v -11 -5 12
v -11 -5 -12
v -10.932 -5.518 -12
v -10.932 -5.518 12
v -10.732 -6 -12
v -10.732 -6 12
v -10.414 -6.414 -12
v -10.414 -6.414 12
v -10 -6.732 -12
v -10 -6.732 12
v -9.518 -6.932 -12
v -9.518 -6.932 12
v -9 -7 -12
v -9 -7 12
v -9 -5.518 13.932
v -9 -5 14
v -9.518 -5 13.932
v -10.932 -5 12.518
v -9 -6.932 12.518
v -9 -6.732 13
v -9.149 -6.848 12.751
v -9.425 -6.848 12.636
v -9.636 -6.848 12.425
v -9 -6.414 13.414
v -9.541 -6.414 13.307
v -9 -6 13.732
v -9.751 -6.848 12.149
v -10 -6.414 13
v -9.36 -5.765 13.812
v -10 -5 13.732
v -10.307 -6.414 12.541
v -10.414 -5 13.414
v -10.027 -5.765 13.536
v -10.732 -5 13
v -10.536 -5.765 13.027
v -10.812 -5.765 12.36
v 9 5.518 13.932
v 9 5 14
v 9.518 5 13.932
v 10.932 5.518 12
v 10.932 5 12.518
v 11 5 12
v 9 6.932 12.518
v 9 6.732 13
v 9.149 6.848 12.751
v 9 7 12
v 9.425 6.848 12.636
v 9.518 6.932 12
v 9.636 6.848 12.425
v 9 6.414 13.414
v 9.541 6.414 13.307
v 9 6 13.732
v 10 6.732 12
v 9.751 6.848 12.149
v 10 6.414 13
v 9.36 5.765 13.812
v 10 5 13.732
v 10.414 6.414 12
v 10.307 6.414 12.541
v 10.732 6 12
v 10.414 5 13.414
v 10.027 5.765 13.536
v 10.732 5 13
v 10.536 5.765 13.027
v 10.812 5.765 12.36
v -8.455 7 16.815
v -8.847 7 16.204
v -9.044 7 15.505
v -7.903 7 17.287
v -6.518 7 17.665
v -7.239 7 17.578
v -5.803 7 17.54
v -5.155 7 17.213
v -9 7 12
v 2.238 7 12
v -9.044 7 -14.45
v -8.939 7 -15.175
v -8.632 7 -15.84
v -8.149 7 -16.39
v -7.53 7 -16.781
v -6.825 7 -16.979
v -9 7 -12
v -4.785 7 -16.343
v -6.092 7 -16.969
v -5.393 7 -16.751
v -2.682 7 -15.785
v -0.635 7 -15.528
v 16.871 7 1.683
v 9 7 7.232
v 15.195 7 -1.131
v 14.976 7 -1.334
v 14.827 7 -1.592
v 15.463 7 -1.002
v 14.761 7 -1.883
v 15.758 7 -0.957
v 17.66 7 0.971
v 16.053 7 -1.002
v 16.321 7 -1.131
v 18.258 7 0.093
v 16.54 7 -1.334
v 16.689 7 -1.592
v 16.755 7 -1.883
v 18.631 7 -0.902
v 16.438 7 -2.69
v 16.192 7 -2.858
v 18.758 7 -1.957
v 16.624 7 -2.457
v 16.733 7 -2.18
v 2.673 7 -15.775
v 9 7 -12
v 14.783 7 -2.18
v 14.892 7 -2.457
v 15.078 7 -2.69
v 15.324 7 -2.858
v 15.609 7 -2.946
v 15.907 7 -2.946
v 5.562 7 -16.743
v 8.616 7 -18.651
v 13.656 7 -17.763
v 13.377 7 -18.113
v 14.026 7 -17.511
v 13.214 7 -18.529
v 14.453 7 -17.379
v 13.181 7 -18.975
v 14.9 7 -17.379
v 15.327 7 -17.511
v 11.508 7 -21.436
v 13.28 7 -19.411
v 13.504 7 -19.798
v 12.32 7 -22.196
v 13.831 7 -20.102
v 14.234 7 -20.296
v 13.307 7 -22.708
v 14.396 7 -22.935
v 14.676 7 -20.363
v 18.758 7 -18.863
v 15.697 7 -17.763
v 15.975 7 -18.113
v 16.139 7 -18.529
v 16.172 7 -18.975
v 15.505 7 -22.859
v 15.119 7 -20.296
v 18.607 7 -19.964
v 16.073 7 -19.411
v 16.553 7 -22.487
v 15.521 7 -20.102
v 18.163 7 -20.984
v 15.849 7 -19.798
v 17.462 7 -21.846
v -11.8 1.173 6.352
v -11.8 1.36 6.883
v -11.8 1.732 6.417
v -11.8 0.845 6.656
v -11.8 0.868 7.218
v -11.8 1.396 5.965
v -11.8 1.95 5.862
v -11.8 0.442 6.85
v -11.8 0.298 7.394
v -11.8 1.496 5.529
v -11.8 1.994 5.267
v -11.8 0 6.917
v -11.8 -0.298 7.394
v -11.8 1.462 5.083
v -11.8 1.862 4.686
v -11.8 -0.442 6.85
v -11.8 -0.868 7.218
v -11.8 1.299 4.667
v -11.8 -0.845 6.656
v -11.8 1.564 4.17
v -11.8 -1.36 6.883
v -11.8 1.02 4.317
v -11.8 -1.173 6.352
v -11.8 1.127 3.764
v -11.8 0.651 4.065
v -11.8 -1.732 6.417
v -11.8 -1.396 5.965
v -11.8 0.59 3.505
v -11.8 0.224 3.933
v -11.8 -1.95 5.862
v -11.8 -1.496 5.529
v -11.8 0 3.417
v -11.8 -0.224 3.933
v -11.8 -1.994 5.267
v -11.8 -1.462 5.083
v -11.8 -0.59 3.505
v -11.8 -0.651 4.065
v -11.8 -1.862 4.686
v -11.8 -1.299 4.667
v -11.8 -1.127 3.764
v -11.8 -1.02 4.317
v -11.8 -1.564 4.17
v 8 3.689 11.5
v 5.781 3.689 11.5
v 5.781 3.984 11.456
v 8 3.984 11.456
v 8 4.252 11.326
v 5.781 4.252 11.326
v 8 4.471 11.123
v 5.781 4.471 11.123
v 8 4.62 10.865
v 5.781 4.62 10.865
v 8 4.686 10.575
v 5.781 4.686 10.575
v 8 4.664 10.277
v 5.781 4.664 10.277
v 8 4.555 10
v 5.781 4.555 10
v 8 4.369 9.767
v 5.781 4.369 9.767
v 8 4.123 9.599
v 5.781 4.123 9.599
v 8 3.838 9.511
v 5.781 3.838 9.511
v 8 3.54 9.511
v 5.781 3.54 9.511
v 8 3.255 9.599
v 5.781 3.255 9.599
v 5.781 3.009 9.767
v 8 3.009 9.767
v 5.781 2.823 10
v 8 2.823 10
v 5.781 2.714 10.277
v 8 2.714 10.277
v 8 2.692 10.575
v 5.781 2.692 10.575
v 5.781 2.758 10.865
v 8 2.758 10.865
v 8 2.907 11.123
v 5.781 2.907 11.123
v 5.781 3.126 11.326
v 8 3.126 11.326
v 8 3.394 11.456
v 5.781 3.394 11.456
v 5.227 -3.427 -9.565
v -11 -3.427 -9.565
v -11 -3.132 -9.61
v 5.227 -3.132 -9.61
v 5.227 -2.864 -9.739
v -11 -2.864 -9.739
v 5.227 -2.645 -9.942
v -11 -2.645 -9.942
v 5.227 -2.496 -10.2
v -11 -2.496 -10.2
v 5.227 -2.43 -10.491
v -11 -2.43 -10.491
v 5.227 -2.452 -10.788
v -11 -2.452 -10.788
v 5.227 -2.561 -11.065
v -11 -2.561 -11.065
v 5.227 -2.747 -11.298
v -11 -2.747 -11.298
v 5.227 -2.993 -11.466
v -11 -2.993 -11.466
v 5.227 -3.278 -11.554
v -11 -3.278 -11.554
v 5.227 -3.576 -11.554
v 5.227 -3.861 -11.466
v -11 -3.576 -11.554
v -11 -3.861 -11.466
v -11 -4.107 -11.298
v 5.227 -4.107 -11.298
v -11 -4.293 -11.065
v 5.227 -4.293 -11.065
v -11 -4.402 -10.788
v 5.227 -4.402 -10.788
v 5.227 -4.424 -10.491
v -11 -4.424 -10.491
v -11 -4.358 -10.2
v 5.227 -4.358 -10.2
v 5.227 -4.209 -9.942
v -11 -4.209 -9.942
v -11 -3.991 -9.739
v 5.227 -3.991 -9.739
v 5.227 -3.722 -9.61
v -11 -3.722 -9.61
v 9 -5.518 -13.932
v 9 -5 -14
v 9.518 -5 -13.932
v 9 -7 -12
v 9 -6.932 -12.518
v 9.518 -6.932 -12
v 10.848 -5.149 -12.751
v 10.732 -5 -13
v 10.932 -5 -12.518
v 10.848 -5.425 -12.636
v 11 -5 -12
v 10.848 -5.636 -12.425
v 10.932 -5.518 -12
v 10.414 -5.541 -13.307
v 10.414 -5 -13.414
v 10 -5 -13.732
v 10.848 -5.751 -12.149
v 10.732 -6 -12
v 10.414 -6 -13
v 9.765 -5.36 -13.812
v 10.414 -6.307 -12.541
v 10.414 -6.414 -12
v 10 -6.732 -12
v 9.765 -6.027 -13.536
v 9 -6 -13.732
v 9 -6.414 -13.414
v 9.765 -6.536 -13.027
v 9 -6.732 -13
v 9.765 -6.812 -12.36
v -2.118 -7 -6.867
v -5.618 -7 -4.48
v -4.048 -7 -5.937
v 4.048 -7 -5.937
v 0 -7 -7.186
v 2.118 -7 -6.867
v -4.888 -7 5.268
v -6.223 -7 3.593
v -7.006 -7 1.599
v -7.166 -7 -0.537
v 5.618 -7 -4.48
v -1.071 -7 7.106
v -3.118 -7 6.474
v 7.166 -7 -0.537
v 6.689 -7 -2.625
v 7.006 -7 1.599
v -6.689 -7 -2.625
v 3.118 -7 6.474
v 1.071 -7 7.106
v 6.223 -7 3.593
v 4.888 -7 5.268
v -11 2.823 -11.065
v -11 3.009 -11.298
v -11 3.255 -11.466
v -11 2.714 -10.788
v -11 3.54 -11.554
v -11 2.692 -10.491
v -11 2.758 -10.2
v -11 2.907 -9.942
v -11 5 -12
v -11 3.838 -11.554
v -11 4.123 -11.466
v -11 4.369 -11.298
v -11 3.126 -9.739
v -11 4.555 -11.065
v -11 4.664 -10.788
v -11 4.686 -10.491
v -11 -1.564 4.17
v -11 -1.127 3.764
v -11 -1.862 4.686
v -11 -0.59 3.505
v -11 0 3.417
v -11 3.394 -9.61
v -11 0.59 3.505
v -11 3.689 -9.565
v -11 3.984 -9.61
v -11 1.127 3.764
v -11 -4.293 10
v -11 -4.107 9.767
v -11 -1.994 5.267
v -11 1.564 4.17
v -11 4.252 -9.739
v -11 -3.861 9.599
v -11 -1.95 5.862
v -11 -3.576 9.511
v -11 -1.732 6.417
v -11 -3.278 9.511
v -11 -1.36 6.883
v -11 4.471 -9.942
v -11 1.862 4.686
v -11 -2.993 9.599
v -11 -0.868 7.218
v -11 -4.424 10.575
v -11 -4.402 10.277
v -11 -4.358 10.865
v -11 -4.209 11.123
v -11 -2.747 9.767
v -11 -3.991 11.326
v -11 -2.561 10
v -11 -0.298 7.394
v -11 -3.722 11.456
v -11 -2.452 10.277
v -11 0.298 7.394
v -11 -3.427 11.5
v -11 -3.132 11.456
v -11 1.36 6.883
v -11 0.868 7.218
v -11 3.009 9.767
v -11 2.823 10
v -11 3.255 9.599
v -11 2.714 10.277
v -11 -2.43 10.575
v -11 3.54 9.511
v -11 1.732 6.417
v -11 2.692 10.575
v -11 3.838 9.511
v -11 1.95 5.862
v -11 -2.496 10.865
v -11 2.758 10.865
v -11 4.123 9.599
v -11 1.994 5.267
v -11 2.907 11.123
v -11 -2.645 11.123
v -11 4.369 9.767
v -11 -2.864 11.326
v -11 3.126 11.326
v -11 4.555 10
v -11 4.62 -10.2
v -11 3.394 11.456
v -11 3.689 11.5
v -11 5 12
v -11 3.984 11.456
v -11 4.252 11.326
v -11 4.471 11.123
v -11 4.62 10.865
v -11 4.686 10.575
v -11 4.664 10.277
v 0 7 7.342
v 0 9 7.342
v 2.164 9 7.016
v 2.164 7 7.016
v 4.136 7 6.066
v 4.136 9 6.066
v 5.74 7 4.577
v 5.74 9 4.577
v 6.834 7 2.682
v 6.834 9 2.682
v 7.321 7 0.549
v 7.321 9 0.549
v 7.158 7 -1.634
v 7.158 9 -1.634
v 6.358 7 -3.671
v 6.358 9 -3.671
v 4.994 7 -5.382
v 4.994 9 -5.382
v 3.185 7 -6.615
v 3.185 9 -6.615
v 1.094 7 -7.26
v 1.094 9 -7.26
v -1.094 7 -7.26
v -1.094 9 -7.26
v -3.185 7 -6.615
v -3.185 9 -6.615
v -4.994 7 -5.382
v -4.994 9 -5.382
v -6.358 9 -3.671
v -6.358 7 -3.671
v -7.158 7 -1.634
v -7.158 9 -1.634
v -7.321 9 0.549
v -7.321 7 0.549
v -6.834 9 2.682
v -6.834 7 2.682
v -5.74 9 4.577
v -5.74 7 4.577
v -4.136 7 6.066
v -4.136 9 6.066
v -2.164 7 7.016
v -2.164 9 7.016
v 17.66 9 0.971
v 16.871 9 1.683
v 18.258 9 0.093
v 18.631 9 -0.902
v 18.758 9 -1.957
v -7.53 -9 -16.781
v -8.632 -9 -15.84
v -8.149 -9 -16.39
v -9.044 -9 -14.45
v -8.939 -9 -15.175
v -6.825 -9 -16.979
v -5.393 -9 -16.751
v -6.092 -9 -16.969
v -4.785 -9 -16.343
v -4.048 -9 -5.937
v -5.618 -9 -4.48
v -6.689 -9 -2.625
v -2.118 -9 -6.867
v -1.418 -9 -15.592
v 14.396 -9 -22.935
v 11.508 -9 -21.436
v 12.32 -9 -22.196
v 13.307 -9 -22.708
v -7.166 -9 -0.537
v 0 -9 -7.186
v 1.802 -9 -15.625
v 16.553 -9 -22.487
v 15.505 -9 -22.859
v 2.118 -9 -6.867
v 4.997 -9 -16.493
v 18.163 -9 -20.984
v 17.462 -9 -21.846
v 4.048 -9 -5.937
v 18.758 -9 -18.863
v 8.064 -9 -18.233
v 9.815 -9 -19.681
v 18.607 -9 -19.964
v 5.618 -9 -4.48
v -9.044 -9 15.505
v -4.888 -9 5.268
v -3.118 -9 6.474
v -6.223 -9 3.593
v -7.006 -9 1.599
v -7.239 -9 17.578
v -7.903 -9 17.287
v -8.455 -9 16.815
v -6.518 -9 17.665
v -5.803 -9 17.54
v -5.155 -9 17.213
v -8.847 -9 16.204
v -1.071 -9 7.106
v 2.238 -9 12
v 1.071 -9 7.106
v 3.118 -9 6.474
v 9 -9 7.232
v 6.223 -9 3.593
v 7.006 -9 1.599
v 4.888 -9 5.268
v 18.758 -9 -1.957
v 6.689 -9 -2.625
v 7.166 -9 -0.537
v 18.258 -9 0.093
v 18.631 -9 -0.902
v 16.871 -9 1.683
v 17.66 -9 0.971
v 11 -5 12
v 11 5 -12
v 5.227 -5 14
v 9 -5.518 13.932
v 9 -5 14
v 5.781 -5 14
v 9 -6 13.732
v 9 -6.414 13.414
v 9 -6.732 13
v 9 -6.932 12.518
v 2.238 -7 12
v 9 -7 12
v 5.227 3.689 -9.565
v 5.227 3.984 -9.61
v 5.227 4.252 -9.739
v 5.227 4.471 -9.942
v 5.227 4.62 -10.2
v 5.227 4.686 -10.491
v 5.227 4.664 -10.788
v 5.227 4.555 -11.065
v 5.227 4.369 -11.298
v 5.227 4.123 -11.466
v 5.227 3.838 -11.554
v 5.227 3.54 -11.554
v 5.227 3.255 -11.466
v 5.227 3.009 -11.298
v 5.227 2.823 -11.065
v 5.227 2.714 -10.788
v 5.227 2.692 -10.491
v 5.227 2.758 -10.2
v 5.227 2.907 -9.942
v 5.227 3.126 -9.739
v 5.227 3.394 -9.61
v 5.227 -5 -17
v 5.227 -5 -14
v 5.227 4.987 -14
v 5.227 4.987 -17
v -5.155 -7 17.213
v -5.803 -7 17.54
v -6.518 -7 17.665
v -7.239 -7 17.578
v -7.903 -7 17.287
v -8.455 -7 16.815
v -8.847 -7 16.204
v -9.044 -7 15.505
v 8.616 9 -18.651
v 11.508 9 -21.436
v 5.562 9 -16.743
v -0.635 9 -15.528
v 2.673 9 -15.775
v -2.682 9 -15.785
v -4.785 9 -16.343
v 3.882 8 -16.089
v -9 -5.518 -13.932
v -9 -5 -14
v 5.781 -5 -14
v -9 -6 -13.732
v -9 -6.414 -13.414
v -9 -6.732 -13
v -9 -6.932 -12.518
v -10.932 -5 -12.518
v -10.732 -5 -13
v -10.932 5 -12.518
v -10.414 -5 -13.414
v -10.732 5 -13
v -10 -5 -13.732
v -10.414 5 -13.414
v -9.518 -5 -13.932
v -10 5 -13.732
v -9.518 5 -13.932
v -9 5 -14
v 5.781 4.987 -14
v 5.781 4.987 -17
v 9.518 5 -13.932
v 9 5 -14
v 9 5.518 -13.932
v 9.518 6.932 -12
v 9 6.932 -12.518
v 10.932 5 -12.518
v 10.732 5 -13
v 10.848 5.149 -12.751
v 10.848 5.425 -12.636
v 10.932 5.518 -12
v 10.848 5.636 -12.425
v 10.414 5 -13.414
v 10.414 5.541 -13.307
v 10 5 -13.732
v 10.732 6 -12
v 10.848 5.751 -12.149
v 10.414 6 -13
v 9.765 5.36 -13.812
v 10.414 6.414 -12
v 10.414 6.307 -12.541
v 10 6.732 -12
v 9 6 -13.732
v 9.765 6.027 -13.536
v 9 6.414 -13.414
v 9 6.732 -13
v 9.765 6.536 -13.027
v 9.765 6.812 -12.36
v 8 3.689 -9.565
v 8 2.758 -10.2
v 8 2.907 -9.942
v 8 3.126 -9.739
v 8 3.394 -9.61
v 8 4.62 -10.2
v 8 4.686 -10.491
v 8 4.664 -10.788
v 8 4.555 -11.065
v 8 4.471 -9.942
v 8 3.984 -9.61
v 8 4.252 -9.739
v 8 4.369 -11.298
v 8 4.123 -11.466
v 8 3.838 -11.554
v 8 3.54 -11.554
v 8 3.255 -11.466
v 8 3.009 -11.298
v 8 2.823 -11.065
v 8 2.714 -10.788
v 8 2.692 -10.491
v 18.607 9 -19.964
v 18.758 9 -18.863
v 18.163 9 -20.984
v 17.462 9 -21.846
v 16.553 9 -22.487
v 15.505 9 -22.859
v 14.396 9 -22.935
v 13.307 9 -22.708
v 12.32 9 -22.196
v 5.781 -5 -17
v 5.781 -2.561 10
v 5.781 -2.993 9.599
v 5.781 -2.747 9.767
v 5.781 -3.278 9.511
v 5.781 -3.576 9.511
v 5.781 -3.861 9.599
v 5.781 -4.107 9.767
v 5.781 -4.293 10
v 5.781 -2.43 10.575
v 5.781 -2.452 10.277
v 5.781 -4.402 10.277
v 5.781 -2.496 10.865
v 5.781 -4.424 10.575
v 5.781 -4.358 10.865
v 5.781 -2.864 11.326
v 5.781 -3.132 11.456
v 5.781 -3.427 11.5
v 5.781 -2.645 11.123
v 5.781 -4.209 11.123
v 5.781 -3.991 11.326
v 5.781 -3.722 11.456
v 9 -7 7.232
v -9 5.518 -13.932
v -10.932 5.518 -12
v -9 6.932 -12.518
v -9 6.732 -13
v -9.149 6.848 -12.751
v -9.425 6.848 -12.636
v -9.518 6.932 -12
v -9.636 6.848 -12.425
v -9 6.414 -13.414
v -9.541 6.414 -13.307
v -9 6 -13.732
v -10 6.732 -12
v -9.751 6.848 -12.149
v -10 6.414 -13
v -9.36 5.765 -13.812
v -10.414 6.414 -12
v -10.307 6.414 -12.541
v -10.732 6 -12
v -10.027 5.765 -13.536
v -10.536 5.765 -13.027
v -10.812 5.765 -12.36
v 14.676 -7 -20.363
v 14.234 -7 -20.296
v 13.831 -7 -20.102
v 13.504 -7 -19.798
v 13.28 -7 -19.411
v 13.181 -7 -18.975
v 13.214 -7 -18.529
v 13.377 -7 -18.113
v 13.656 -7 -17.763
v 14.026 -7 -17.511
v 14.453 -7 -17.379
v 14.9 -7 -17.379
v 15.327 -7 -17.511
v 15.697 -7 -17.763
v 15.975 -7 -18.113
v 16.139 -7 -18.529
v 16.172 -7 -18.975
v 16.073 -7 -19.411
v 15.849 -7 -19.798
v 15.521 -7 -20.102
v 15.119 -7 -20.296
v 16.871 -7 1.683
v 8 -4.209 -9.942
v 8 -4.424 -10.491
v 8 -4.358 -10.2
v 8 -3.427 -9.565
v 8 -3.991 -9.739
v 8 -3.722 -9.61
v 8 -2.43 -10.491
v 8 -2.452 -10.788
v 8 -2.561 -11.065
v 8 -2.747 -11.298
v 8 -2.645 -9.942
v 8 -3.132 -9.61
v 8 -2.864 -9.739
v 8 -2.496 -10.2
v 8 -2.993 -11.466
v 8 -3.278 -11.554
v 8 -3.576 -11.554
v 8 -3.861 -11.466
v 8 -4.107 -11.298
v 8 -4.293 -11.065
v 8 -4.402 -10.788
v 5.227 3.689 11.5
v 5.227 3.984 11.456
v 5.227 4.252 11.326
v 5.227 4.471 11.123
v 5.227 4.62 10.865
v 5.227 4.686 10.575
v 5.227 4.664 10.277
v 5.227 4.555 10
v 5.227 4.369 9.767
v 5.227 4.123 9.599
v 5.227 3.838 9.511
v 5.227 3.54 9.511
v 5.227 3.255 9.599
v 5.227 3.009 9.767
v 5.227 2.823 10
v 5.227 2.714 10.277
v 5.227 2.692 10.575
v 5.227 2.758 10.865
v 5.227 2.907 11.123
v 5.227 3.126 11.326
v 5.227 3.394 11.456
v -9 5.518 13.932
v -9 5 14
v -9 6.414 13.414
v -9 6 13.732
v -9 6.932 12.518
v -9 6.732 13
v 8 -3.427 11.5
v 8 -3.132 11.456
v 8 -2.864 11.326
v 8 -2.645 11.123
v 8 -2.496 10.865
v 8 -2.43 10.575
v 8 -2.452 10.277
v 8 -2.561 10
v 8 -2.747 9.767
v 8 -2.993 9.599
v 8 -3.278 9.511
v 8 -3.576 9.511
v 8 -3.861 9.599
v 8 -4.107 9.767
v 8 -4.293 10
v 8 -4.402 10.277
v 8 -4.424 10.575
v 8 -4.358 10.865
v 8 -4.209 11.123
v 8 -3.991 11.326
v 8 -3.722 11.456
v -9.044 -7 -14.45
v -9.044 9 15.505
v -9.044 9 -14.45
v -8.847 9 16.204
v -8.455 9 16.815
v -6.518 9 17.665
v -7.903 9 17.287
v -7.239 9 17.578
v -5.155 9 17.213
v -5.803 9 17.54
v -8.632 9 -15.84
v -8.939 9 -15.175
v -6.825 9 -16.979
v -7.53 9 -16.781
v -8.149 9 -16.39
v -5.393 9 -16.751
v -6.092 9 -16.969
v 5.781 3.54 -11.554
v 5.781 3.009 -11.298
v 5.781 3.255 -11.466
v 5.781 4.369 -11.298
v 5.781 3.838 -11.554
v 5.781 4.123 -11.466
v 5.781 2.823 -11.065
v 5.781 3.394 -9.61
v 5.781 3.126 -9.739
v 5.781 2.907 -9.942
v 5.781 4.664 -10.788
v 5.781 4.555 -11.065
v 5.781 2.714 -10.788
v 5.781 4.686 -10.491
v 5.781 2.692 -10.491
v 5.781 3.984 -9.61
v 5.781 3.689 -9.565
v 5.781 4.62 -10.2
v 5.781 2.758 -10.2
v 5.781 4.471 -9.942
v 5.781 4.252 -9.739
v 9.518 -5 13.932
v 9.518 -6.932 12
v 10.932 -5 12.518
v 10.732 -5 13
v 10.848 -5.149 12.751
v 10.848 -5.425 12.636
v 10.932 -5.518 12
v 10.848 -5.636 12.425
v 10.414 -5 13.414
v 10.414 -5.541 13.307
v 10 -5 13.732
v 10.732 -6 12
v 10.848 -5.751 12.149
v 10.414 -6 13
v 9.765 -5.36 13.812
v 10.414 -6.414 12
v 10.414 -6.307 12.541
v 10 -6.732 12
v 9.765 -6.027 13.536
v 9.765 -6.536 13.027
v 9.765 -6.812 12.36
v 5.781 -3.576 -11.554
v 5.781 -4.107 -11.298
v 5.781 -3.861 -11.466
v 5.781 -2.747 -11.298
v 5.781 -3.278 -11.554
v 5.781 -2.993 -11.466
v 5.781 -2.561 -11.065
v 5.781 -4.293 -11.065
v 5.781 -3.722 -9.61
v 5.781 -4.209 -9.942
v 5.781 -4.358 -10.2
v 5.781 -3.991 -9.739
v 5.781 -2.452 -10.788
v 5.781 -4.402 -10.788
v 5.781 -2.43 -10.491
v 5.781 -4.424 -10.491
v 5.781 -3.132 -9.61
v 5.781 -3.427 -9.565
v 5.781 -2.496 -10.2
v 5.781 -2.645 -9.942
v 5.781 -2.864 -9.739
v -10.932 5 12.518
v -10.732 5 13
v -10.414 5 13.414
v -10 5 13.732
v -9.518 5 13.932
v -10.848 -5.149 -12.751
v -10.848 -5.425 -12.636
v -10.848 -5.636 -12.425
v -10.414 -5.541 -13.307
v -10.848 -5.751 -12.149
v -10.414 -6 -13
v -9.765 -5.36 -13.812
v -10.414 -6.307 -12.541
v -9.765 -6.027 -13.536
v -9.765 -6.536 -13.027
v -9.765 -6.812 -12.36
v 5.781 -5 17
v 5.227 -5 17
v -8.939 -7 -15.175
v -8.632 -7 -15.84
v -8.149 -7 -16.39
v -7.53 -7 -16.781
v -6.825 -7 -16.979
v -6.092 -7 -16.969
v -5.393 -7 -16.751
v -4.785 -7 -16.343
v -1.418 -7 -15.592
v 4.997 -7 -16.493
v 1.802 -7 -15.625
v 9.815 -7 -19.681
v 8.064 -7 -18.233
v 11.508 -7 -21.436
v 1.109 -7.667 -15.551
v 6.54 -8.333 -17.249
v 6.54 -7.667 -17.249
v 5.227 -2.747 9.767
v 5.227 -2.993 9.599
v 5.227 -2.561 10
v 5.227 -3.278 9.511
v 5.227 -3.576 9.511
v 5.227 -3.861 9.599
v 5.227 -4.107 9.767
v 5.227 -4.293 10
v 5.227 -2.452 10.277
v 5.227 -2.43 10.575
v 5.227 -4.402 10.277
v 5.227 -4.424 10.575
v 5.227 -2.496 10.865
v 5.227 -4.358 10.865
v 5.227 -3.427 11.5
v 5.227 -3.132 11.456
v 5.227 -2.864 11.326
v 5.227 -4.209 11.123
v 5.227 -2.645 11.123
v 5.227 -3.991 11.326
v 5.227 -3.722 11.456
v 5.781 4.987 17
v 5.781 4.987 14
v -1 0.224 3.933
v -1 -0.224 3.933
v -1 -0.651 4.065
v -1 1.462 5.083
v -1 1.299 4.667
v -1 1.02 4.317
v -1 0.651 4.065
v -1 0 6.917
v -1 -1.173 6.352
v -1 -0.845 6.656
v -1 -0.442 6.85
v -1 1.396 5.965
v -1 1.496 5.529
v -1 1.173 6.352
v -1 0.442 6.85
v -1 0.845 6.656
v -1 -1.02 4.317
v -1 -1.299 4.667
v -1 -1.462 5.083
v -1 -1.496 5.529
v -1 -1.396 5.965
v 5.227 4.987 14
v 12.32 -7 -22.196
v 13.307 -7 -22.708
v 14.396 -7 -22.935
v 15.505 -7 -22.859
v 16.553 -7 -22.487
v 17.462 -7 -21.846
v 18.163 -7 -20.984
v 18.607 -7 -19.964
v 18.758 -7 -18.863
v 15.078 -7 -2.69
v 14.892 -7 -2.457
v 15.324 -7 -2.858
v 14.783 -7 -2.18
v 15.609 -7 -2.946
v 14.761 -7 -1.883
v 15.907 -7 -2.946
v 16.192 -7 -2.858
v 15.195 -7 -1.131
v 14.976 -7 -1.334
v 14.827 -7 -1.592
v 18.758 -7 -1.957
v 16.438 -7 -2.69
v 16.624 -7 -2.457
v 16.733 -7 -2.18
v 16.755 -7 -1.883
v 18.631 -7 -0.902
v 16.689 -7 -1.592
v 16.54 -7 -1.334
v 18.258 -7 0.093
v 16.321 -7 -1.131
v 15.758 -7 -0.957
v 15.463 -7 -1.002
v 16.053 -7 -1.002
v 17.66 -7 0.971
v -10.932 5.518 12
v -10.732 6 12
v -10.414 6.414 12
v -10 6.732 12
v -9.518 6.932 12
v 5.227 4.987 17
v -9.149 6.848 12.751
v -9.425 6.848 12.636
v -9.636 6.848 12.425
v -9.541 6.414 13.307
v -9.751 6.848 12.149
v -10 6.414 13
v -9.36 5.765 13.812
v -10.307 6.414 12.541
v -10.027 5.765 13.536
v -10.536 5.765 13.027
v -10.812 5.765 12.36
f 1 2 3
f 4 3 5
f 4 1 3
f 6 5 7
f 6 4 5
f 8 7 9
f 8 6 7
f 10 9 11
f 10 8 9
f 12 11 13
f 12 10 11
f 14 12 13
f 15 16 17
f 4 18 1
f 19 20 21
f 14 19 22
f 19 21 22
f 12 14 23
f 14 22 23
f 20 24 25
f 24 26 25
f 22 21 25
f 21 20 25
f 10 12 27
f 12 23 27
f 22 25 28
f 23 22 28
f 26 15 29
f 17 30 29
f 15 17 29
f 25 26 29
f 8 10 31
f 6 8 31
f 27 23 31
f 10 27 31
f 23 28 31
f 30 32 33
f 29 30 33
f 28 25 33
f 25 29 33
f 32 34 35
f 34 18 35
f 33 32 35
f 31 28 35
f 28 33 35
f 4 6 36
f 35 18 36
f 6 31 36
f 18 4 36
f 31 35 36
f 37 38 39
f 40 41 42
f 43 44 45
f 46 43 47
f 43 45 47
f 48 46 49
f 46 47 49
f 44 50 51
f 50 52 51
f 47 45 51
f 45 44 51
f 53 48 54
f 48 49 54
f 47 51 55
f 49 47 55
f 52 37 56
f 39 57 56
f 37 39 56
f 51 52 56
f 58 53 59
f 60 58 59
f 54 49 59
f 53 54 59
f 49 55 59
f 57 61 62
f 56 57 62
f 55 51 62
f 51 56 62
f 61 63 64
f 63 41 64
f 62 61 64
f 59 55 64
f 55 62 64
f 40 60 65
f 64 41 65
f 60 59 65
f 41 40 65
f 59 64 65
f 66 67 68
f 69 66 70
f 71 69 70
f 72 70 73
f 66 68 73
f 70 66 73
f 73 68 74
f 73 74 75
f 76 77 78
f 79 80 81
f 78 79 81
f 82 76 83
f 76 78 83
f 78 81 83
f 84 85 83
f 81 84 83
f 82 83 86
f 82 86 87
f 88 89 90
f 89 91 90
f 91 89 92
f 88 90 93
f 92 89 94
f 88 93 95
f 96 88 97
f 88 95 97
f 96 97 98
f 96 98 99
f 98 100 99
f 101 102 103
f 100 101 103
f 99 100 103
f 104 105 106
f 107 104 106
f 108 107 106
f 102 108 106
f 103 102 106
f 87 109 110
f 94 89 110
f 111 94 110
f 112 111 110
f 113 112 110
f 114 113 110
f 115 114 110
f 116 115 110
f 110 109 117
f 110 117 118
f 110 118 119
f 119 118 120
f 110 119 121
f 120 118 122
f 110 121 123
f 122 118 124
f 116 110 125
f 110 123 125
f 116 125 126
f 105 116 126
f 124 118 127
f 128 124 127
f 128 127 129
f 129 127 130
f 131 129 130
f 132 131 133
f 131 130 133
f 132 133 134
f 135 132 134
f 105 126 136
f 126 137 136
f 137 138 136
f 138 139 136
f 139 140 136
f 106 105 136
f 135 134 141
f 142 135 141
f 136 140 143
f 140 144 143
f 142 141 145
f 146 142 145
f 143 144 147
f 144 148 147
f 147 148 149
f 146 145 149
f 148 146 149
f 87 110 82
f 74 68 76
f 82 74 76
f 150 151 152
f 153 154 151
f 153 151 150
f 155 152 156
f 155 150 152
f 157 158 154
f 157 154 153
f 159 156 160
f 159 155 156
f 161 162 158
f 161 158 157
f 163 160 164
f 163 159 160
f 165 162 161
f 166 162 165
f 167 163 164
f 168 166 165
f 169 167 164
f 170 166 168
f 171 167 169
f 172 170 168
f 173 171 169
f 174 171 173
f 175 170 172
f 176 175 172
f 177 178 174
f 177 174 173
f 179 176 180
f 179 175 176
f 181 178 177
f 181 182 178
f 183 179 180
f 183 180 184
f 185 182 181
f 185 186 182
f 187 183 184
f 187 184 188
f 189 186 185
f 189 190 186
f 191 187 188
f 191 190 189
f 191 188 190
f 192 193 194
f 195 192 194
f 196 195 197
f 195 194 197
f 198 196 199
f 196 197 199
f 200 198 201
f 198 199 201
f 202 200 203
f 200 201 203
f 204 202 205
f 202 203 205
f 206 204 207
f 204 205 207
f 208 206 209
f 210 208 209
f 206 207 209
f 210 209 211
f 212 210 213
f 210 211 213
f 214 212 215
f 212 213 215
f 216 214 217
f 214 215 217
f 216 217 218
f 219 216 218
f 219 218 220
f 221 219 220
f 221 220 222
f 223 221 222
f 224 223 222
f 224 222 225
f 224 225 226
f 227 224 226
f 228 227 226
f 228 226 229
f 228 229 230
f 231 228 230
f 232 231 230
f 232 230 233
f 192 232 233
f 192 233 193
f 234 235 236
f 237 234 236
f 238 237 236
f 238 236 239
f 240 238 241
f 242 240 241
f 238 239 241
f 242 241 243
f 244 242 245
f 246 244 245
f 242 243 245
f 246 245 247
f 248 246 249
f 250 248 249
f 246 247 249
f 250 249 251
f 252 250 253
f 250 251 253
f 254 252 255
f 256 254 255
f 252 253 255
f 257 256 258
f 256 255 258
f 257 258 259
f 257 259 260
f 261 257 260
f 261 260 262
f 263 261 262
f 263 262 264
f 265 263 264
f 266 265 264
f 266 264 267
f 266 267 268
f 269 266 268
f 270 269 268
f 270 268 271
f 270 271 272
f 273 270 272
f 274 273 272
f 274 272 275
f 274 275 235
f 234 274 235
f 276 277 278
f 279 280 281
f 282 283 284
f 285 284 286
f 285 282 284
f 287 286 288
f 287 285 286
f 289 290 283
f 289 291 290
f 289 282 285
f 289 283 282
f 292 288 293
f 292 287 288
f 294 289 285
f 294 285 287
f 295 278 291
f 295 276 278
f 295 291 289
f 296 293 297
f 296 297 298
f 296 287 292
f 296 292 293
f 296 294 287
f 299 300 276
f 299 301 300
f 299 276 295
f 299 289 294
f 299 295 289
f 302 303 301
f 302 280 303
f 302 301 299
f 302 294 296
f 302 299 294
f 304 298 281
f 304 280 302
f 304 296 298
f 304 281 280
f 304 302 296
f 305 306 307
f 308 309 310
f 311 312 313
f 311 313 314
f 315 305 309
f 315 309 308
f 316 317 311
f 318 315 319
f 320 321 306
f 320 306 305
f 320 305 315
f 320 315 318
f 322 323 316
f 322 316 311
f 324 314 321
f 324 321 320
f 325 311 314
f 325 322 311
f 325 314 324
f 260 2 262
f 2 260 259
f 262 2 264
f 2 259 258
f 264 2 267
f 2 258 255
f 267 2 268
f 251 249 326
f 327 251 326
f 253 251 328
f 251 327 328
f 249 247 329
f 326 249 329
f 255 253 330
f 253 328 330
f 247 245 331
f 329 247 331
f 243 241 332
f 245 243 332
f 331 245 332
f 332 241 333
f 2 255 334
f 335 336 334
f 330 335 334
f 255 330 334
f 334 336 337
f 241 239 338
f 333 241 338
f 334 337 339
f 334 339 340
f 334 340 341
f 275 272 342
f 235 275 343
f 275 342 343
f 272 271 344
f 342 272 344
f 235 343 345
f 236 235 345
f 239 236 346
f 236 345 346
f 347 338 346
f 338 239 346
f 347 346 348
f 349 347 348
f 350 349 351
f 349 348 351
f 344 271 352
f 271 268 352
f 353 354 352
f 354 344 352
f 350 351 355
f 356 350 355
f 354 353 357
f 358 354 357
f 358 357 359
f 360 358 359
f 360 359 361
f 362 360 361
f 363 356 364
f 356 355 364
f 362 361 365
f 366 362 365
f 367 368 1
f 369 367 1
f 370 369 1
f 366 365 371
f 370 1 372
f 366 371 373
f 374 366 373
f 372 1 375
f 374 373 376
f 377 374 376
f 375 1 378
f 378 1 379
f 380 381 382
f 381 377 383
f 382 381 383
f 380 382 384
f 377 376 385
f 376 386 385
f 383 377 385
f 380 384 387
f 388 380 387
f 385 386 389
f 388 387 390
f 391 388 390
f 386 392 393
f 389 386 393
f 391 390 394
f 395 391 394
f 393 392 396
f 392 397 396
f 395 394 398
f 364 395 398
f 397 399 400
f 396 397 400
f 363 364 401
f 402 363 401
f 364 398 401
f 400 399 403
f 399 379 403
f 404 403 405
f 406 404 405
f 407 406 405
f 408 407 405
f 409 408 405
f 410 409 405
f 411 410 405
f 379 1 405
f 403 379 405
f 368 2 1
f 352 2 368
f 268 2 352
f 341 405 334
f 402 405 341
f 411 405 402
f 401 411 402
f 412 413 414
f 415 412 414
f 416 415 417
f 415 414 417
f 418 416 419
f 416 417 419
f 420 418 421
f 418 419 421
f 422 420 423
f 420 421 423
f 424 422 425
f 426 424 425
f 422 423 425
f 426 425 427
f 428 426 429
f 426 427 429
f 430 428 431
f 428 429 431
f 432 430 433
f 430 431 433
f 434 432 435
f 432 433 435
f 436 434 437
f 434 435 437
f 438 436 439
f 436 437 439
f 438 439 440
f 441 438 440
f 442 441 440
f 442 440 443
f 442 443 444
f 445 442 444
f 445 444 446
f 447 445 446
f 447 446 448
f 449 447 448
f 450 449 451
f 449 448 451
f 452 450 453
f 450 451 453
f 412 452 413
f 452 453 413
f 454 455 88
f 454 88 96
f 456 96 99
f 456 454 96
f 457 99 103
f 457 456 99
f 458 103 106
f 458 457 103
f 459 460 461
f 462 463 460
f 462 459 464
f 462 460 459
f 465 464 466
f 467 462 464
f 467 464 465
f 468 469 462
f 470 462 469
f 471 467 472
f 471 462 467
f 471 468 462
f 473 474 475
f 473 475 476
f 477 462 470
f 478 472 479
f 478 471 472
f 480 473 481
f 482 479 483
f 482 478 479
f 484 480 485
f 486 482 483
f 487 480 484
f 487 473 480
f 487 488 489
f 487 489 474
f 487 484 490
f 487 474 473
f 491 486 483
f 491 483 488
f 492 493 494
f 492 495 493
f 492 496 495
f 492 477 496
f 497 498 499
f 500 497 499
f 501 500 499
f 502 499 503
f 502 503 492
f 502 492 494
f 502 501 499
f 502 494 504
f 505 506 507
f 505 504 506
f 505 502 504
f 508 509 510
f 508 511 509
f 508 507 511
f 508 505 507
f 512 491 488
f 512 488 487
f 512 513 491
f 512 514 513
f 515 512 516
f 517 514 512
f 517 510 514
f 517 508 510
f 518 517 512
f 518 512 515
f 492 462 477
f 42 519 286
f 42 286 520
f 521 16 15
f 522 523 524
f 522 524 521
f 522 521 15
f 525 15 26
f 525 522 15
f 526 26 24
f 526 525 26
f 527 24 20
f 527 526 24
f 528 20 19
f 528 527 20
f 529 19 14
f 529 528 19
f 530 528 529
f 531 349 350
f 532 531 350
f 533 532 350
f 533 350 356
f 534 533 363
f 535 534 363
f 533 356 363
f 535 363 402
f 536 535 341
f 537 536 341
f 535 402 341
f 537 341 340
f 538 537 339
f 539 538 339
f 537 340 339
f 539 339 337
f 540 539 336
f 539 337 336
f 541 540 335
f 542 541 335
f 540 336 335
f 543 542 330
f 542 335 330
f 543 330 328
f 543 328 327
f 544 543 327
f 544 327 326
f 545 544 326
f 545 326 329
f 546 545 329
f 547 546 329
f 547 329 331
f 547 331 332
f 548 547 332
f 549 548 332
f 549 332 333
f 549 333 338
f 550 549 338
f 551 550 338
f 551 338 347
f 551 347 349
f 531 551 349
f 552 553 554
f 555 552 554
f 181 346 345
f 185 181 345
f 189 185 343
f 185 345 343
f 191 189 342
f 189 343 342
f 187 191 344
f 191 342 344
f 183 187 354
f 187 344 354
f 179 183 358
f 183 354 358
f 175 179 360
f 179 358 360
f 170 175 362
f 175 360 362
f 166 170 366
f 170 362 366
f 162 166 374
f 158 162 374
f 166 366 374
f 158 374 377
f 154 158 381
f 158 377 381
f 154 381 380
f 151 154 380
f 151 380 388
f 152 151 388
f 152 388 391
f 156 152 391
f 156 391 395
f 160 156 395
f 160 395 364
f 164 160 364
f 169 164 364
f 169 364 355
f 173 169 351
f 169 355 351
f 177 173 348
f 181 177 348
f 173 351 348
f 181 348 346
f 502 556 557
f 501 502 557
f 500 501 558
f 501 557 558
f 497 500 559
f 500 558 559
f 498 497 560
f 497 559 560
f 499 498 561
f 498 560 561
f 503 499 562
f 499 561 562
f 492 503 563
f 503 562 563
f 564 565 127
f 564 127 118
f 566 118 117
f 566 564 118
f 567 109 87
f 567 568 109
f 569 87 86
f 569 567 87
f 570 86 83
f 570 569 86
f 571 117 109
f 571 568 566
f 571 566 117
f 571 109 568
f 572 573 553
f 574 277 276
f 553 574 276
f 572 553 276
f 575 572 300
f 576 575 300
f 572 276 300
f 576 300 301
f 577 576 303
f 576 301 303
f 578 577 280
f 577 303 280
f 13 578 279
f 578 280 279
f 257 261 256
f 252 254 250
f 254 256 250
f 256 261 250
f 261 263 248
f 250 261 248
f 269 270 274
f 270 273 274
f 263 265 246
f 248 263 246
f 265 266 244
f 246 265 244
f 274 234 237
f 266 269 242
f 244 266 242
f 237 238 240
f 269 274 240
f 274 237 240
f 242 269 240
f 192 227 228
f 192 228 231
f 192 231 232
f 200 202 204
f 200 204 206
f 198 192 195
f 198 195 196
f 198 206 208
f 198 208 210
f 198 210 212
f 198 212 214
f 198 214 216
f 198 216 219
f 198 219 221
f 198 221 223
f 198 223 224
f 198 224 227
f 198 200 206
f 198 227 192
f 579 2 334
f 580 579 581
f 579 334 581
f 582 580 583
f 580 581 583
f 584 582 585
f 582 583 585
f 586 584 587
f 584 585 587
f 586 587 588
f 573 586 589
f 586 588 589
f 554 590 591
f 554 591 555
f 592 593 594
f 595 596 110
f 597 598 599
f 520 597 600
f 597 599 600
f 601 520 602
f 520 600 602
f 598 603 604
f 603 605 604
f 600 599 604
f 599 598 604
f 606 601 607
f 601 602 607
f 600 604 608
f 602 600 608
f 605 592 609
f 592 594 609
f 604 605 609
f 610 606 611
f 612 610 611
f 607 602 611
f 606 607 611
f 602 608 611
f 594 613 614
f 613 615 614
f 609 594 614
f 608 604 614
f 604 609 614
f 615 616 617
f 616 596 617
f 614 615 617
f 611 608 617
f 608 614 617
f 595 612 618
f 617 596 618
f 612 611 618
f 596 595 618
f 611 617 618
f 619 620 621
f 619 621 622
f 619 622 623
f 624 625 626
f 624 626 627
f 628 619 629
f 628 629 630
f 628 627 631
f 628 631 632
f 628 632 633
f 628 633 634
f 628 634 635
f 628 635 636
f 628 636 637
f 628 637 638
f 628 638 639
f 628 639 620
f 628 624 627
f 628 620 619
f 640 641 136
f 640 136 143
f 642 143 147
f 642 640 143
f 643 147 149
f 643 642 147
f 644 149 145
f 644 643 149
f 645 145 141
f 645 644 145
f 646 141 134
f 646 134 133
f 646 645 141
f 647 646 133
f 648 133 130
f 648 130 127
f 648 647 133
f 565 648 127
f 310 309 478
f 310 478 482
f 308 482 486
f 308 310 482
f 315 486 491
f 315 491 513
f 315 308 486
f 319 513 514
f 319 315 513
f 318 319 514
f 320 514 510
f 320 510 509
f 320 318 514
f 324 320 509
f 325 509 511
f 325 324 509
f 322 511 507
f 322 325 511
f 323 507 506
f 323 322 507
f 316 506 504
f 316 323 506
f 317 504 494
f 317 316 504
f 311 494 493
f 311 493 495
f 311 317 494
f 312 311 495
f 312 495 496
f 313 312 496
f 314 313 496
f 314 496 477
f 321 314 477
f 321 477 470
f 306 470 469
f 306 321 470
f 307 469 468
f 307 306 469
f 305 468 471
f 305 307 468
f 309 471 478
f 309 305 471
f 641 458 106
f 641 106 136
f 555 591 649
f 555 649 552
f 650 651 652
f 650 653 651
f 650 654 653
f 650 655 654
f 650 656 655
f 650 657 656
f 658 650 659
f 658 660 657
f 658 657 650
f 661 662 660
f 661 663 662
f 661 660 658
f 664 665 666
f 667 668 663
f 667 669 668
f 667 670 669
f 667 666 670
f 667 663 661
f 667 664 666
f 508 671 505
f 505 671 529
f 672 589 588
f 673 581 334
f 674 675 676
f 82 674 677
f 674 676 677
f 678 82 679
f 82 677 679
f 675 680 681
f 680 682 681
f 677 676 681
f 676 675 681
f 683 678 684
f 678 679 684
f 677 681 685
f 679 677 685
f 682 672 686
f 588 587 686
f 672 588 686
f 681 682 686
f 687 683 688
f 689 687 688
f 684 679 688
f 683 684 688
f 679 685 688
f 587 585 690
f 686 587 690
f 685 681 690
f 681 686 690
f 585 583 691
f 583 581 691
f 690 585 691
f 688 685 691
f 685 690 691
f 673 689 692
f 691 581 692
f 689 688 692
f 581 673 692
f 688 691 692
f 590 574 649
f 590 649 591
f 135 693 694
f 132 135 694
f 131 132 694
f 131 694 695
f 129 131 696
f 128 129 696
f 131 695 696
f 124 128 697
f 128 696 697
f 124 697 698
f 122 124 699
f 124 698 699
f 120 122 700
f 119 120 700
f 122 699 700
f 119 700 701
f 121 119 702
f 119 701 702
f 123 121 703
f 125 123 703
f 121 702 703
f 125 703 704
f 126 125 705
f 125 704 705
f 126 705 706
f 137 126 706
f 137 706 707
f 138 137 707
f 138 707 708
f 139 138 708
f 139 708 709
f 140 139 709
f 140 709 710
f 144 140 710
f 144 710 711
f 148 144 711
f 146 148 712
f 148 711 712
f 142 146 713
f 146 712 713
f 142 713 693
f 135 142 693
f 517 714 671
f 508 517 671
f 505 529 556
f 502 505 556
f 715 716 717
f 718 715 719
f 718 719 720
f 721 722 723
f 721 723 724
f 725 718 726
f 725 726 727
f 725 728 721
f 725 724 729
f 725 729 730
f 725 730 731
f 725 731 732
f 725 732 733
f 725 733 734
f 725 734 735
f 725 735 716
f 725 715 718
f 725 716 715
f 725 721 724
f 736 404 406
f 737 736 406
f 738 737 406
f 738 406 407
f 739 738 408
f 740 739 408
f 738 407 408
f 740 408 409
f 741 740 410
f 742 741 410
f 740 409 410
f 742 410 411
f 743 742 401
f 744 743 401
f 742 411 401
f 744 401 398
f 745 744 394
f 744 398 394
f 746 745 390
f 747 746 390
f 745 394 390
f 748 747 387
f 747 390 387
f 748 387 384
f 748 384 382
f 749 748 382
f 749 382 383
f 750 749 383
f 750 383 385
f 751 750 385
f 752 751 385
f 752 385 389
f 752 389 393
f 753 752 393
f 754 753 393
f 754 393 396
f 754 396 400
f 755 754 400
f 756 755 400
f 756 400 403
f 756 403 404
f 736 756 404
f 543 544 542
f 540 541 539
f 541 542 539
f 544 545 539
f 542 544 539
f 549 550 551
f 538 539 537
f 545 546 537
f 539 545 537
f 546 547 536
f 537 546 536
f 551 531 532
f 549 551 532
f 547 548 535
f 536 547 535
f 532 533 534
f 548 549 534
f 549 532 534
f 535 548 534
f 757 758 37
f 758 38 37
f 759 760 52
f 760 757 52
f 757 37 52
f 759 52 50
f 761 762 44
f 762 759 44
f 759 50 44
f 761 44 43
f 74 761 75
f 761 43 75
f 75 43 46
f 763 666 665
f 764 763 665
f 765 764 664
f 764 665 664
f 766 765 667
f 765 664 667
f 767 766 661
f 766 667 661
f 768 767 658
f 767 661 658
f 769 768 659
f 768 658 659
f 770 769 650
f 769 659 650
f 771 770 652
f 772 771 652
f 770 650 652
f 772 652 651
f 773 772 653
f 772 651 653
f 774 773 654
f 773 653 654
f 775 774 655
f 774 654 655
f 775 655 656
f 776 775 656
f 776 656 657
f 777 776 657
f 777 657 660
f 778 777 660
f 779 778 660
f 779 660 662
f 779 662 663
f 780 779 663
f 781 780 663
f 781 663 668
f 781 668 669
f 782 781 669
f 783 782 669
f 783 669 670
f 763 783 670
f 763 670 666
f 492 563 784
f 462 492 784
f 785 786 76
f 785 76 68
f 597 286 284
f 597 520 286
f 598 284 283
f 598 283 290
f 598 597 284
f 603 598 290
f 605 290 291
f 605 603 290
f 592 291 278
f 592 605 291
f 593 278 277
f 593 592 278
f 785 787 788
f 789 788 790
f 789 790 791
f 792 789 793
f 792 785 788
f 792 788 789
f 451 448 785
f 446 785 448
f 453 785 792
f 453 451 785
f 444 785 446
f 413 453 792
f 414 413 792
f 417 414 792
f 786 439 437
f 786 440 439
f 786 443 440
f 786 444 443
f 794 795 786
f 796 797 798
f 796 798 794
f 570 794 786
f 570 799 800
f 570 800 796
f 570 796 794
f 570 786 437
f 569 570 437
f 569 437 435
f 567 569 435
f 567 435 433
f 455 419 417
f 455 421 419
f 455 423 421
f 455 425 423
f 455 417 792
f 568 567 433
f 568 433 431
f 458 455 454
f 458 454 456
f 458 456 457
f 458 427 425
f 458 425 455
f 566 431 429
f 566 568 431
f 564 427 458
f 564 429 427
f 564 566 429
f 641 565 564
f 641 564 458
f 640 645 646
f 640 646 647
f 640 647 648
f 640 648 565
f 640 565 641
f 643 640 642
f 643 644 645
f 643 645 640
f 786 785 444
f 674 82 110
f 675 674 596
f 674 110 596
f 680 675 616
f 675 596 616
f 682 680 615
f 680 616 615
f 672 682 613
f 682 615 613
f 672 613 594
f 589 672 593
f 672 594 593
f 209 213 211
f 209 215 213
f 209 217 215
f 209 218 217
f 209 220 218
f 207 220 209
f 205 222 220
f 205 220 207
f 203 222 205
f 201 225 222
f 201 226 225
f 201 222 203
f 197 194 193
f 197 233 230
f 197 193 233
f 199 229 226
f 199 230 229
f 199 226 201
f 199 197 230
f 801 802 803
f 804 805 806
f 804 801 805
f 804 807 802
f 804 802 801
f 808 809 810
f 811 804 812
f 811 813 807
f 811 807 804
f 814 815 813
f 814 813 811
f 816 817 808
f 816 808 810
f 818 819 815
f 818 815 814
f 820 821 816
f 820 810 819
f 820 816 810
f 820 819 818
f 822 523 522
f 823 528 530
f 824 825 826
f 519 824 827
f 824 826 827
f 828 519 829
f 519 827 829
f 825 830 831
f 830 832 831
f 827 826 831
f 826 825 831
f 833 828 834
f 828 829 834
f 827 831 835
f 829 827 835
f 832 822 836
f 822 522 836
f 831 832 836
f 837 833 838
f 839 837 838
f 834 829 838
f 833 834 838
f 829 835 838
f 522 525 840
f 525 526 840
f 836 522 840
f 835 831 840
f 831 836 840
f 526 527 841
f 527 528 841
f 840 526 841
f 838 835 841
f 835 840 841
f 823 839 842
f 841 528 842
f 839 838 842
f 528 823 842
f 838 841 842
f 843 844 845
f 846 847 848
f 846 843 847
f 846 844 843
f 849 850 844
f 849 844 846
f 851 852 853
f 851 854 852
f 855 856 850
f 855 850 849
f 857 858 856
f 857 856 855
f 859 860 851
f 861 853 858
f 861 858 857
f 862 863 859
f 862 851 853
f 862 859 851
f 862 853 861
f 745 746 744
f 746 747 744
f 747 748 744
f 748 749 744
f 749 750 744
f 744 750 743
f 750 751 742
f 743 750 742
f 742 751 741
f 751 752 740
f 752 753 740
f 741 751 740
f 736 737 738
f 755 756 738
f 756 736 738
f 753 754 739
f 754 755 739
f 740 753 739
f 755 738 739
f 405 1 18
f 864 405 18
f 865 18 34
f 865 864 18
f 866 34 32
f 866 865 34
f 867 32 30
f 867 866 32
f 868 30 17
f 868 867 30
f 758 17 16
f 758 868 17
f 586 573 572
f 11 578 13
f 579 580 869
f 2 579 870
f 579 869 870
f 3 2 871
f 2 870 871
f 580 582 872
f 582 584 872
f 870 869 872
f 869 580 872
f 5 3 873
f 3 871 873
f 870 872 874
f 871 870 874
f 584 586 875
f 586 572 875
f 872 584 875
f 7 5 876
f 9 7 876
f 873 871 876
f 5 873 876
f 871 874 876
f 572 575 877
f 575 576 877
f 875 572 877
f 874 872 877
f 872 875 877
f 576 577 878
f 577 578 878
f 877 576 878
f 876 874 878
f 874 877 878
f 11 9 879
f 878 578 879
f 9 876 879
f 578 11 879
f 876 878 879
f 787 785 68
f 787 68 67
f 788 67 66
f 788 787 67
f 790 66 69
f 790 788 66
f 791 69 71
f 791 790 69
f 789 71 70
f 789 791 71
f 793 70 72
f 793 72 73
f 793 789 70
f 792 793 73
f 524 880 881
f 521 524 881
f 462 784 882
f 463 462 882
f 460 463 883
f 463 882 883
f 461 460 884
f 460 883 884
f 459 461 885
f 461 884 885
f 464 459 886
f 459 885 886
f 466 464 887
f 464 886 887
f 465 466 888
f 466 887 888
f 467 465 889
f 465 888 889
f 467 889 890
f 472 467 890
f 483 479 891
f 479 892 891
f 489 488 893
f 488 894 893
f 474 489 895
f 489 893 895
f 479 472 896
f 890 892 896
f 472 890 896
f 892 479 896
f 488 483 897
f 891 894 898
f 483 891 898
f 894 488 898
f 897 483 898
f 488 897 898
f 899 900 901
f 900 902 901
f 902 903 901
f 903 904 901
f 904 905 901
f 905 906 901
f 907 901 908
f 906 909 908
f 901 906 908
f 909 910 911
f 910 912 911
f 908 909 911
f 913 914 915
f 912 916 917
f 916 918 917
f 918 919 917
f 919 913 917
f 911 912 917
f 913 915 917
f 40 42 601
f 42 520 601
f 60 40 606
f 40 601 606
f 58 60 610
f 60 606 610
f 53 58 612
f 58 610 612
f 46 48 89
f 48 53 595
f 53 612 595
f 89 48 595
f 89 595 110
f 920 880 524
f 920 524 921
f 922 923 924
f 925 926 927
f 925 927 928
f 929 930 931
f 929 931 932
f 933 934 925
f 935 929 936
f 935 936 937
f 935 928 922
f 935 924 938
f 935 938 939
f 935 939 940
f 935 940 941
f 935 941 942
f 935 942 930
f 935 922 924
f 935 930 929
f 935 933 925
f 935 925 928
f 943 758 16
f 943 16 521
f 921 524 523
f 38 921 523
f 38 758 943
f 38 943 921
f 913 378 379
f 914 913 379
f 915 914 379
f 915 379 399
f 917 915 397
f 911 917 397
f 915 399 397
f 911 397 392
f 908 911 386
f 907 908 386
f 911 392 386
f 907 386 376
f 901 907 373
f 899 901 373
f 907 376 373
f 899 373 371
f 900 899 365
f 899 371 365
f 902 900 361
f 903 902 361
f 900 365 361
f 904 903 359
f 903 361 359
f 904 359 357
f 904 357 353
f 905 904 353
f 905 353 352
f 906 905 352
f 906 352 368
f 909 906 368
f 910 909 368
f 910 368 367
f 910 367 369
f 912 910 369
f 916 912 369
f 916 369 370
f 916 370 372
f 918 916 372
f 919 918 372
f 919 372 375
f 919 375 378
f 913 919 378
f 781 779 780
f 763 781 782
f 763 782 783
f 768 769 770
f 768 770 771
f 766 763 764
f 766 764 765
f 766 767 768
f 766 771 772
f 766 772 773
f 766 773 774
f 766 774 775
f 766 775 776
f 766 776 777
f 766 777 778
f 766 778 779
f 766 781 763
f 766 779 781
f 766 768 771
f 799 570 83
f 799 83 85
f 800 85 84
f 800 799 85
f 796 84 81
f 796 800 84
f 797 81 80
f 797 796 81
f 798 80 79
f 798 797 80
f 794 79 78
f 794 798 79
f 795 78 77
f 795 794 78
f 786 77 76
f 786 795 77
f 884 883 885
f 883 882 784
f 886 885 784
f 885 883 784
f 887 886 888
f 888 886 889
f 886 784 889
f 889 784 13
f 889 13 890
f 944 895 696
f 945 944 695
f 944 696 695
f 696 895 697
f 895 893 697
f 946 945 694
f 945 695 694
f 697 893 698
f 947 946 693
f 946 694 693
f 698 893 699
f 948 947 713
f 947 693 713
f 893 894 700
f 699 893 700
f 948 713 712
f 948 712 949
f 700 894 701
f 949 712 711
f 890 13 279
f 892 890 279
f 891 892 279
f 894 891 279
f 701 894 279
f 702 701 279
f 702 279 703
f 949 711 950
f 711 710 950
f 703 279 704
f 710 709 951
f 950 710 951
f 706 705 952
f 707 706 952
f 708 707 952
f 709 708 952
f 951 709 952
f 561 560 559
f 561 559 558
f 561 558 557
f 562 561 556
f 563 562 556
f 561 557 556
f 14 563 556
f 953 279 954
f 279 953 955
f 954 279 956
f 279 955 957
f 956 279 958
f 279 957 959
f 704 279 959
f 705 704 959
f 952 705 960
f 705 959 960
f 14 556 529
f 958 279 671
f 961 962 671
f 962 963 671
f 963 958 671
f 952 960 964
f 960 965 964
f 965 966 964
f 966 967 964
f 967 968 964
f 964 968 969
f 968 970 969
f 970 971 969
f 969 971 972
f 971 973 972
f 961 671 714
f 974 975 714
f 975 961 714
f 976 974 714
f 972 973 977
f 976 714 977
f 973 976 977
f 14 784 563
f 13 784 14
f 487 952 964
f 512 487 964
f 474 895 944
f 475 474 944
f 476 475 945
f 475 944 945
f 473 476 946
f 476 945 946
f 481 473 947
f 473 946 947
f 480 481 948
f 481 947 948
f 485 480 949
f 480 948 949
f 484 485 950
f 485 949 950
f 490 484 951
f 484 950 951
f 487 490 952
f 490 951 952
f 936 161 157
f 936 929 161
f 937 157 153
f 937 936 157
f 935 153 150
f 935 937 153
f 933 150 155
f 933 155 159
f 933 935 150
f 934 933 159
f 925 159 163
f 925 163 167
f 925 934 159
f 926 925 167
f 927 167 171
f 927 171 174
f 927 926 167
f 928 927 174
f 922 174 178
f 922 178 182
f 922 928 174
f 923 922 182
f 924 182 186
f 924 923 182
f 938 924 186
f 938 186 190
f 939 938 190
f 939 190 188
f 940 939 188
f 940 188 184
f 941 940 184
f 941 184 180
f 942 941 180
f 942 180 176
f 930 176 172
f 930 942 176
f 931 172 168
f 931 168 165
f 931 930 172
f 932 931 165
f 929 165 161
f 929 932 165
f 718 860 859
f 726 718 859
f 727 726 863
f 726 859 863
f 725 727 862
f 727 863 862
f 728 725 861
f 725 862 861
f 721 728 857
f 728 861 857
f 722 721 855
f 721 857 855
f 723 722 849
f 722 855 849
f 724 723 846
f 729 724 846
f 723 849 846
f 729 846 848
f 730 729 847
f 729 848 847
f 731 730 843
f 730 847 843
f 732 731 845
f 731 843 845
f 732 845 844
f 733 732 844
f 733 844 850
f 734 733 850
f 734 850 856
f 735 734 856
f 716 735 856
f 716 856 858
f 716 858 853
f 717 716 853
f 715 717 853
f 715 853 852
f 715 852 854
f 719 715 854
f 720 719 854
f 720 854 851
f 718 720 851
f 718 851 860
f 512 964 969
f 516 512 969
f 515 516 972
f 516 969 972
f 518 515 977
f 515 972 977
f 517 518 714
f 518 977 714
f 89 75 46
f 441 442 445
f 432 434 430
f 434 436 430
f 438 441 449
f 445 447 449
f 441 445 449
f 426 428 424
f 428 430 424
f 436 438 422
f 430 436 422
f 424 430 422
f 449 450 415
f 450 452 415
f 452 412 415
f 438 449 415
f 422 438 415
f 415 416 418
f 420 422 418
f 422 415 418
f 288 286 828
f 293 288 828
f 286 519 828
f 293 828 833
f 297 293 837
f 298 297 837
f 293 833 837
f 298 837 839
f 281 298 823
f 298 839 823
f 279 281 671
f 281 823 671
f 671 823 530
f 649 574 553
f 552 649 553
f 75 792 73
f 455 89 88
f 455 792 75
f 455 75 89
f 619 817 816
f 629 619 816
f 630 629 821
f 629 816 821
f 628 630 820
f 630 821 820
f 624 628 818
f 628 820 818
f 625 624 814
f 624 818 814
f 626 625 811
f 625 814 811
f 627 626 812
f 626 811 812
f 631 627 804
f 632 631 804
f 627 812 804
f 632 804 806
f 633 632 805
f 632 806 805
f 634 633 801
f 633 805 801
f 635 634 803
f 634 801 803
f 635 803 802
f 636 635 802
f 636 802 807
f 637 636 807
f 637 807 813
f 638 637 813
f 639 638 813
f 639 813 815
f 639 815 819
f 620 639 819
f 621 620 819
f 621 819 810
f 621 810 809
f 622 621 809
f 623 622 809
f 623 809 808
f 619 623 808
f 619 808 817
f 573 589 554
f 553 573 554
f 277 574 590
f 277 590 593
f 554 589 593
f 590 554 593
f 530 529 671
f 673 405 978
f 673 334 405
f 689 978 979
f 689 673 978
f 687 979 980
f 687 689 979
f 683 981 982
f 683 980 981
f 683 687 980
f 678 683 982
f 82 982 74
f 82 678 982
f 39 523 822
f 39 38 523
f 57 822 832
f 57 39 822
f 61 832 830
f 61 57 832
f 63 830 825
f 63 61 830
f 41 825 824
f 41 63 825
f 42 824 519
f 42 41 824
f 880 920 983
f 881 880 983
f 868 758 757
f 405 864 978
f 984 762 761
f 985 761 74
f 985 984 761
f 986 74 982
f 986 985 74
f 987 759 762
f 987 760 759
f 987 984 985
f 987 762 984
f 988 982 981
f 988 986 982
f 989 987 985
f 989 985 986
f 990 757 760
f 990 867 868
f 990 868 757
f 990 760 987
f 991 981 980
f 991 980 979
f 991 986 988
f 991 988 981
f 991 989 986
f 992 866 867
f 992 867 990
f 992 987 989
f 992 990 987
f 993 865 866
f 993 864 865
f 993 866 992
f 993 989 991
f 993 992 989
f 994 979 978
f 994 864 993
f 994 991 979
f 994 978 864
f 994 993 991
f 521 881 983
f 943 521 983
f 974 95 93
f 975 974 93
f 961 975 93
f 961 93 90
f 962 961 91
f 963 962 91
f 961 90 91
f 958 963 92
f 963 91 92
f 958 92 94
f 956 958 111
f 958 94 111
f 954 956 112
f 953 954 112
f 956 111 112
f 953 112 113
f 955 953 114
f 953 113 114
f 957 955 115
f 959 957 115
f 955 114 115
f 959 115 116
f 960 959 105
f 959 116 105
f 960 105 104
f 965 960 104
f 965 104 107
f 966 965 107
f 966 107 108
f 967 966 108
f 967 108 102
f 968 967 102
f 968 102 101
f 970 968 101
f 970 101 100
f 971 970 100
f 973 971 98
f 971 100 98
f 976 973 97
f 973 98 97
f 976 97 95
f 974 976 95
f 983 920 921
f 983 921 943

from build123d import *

# Parameters (mm, degrees)
SKETCH1_W                = 22
SKETCH1_H                = 14
BOSS_EXTRUDE1_DEPTH      = 14
FILLET1_R                = 2
SKETCH2_R                = 1
CUT_EXTRUDE1_DEPTH       = 19
BOSS_EXTRUDE2_DEPTH      = 3
BOSS_EXTRUDE2_DEPTH_BACK = 31
SKETCH3_W                = 0.554521252
SKETCH3_H                = 9.98669991
SKETCH4_R                = 2
SKETCH4_R_2              = 1.5
BOSS_EXTRUDE3_DEPTH      = 0.8
CUT_EXTRUDE2_START       = -10
SKETCH4_2_R              = 1.5
CUT_EXTRUDE2_DEPTH       = 10
SKETCH5_R                = 7.185985437
BOSS_EXTRUDE5_DEPTH      = 2
BOSS_EXTRUDE6_START      = 2
SKETCH6_R                = 7.341706918
BOSS_EXTRUDE6_DEPTH      = 2
SKETCH7_R                = 1.5
BOSS_EXTRUDE7_DEPTH      = 14
SKETCH8_R                = 1
BOSS_EXTRUDE8_DEPTH      = 14


with BuildPart() as part:
    # Sketch1 → Boss-Extrude1 (new, symmetric)
    with BuildSketch(Plane.XY):
        Rectangle(SKETCH1_W, SKETCH1_H)
    extrude(amount=BOSS_EXTRUDE1_DEPTH, both=True)

    # Fillet1
    fillet1_edges = [part.edges().sort_by_distance(p)[0] for p in [
        (-11, 0, 14),
        (0, -7, 14),
        (11, 0, 14),
        (0, -7, -14),
        (-11, 0, -14),
        (0, 7, -14),
        (11, 0, -14),
        (0, 7, 14),
        (11, -7, 0),
        (-11, -7, 0),
        (-11, 7, 0),
        (11, 7, 0),
    ]]
    fillet(fillet1_edges, radius=FILLET1_R)

    # Sketch2 → Cut-Extrude1 (cut)
    with BuildSketch(Plane.ZY.offset(11)):
        with Locations((-10.565380275, 3.689151377)):
            Circle(SKETCH2_R)
        with Locations((10.5, 3.689151377)):
            Circle(SKETCH2_R)
        with Locations((10.5, -3.4271998)):
            Circle(SKETCH2_R)
        with Locations((-10.565380275, -3.4271998)):
            Circle(SKETCH2_R)
    extrude(amount=-CUT_EXTRUDE1_DEPTH, mode=Mode.SUBTRACT)

    # Sketch3 → Boss-Extrude2 (add, two sides: drawn at the far end of the back side and taken through both)
    with BuildSketch(Plane(origin=(0, 0, -14), x_dir=(-1, 0, 0), z_dir=(0, 0, -1)).offset(-BOSS_EXTRUDE2_DEPTH_BACK)):
        with Locations((-5.504015561, -0.006650045)):
            Rectangle(SKETCH3_W, SKETCH3_H)
    extrude(amount=BOSS_EXTRUDE2_DEPTH + BOSS_EXTRUDE2_DEPTH_BACK)

    # Sketch4 → Boss-Extrude3 (add)
    with BuildSketch(Plane.ZY.offset(11)):
        with Locations(Location((5.416543399, 0, 0), (0, 0, 180))):
            Circle(SKETCH4_R)
        with Locations((5.416543399, 0)):
            Circle(SKETCH4_R_2, mode=Mode.SUBTRACT)
    extrude(amount=BOSS_EXTRUDE3_DEPTH)

    # Sketch4<2> → Cut-Extrude2 (cut)
    with BuildSketch(Plane.ZY.offset(11).offset(CUT_EXTRUDE2_START)):
        with Locations((5.416543399, 0)):
            Circle(SKETCH4_2_R)
    extrude(amount=CUT_EXTRUDE2_DEPTH, mode=Mode.SUBTRACT)

    # Sketch5 → Boss-Extrude5 (add)
    # profile 1 of 2: a face of its own
    with BuildSketch(Plane.XZ.offset(7)):
        with BuildLine():
            Line((2.238059124, 12), (-5.155279816, 17.212901612))
            ThreePointArc((-5.155279816, 17.212901612), (-7.581820377, 17.456866553), (-9.044402043, 15.505335653))
            Line((-9.044402043, 15.505335653), (-9.044402043, 14.86603547))
            Line((-9.044402043, 14.86603547), (-9.044402043, -14.449829967))
            ThreePointArc((-9.044402043, -14.449829967), (-7.529616483, -16.780632089), (-4.78450574, -16.342932608))
            add(Edge.make_bspline(
                [(-4.78450574, -16.342932608), (1.340585112, -14.306096739), (6.77146781, -16.003800215), (11.508142355, -21.436043034)],
                knots=[0.084300371, 0.084300371, 0.084300371, 0.084300371, 1, 1, 1, 1], degree=3))
            ThreePointArc((11.508142355, -21.436043034), (16.041717565, -22.709236327), (18.758055645, -18.862701162))
            Line((18.758055645, -18.862701162), (18.758055645, -1.957446637))
            ThreePointArc((18.758055645, -1.957446637), (18.258122382, 0.092853884), (16.870544719, 1.682914803))
            Line((16.870544719, 1.682914803), (9, 7.232285064))
            Line((9, 7.232285064), (9, -12))
            Line((9, -12), (-9, -12))
            Line((-9, -12), (-9, 12))
            Line((-9, 12), (2.238059124, 12))
        make_face()
    # profile 2 of 2: a face of its own
    with BuildSketch(Plane.XZ.offset(7)):
        Polygon((9, 7.232285064), (2.238059124, 12), (-9, 12), (-9, -12), (9, -12), align=None)
        with Locations(Location((0, 0, 0), (0, 0, 270))):
            Circle(SKETCH5_R, mode=Mode.SUBTRACT)
    extrude(amount=BOSS_EXTRUDE5_DEPTH)

    # Sketch6 → Boss-Extrude6 (add)
    with BuildSketch(Plane(origin=(0, 7, 0), x_dir=(1, 0, 0), z_dir=(0, 1, 0)).offset(BOSS_EXTRUDE6_START)):
        with BuildLine():
            Line((-5.155279816, -17.212901612), (16.870544719, -1.682914803))
            ThreePointArc((16.870544719, -1.682914803), (18.258122382, -0.092853884), (18.758055645, 1.957446637))
            Line((18.758055645, 1.957446637), (18.758055645, 18.862701162))
            ThreePointArc((18.758055645, 18.862701162), (16.041717554, 22.709236331), (11.50814234, 21.436043017))
            add(Edge.make_bspline(
                [(11.50814234, 21.436043017), (4.403130528, 13.287678808), (-4.78450574, 16.342932608)],
                knots=[0, 0, 0, 1, 1, 1], degree=2))
            ThreePointArc((-4.78450574, 16.342932608), (-7.529616483, 16.780632089), (-9.044402043, 14.449829967))
            Line((-9.044402043, 14.449829967), (-9.044402043, -15.505335653))
            ThreePointArc((-9.044402043, -15.505335653), (-7.581820377, -17.456866553), (-5.155279816, -17.212901612))
        make_face()
        with Locations(Location((0, 0, 0), (0, 0, 270))):
            Circle(SKETCH6_R, mode=Mode.SUBTRACT)
    extrude(amount=-BOSS_EXTRUDE6_DEPTH)

    # Sketch7 → Boss-Extrude7 (add)
    with BuildSketch(Plane(origin=(0, -7, 0), x_dir=(1, 0, 0), z_dir=(0, 1, 0))):
        with Locations(Location((14.676397787, 18.862701162, 0), (0, 0, 90))):
            Circle(SKETCH7_R)
    extrude(amount=BOSS_EXTRUDE7_DEPTH)

    # Sketch8 → Boss-Extrude8 (add)
    with BuildSketch(Plane.XZ.offset(-7)):
        with Locations(Location((15.758055645, -1.957446637, 0), (0, 0, 90))):
            Circle(SKETCH8_R)
    extrude(amount=BOSS_EXTRUDE8_DEPTH)


solid = part.part
